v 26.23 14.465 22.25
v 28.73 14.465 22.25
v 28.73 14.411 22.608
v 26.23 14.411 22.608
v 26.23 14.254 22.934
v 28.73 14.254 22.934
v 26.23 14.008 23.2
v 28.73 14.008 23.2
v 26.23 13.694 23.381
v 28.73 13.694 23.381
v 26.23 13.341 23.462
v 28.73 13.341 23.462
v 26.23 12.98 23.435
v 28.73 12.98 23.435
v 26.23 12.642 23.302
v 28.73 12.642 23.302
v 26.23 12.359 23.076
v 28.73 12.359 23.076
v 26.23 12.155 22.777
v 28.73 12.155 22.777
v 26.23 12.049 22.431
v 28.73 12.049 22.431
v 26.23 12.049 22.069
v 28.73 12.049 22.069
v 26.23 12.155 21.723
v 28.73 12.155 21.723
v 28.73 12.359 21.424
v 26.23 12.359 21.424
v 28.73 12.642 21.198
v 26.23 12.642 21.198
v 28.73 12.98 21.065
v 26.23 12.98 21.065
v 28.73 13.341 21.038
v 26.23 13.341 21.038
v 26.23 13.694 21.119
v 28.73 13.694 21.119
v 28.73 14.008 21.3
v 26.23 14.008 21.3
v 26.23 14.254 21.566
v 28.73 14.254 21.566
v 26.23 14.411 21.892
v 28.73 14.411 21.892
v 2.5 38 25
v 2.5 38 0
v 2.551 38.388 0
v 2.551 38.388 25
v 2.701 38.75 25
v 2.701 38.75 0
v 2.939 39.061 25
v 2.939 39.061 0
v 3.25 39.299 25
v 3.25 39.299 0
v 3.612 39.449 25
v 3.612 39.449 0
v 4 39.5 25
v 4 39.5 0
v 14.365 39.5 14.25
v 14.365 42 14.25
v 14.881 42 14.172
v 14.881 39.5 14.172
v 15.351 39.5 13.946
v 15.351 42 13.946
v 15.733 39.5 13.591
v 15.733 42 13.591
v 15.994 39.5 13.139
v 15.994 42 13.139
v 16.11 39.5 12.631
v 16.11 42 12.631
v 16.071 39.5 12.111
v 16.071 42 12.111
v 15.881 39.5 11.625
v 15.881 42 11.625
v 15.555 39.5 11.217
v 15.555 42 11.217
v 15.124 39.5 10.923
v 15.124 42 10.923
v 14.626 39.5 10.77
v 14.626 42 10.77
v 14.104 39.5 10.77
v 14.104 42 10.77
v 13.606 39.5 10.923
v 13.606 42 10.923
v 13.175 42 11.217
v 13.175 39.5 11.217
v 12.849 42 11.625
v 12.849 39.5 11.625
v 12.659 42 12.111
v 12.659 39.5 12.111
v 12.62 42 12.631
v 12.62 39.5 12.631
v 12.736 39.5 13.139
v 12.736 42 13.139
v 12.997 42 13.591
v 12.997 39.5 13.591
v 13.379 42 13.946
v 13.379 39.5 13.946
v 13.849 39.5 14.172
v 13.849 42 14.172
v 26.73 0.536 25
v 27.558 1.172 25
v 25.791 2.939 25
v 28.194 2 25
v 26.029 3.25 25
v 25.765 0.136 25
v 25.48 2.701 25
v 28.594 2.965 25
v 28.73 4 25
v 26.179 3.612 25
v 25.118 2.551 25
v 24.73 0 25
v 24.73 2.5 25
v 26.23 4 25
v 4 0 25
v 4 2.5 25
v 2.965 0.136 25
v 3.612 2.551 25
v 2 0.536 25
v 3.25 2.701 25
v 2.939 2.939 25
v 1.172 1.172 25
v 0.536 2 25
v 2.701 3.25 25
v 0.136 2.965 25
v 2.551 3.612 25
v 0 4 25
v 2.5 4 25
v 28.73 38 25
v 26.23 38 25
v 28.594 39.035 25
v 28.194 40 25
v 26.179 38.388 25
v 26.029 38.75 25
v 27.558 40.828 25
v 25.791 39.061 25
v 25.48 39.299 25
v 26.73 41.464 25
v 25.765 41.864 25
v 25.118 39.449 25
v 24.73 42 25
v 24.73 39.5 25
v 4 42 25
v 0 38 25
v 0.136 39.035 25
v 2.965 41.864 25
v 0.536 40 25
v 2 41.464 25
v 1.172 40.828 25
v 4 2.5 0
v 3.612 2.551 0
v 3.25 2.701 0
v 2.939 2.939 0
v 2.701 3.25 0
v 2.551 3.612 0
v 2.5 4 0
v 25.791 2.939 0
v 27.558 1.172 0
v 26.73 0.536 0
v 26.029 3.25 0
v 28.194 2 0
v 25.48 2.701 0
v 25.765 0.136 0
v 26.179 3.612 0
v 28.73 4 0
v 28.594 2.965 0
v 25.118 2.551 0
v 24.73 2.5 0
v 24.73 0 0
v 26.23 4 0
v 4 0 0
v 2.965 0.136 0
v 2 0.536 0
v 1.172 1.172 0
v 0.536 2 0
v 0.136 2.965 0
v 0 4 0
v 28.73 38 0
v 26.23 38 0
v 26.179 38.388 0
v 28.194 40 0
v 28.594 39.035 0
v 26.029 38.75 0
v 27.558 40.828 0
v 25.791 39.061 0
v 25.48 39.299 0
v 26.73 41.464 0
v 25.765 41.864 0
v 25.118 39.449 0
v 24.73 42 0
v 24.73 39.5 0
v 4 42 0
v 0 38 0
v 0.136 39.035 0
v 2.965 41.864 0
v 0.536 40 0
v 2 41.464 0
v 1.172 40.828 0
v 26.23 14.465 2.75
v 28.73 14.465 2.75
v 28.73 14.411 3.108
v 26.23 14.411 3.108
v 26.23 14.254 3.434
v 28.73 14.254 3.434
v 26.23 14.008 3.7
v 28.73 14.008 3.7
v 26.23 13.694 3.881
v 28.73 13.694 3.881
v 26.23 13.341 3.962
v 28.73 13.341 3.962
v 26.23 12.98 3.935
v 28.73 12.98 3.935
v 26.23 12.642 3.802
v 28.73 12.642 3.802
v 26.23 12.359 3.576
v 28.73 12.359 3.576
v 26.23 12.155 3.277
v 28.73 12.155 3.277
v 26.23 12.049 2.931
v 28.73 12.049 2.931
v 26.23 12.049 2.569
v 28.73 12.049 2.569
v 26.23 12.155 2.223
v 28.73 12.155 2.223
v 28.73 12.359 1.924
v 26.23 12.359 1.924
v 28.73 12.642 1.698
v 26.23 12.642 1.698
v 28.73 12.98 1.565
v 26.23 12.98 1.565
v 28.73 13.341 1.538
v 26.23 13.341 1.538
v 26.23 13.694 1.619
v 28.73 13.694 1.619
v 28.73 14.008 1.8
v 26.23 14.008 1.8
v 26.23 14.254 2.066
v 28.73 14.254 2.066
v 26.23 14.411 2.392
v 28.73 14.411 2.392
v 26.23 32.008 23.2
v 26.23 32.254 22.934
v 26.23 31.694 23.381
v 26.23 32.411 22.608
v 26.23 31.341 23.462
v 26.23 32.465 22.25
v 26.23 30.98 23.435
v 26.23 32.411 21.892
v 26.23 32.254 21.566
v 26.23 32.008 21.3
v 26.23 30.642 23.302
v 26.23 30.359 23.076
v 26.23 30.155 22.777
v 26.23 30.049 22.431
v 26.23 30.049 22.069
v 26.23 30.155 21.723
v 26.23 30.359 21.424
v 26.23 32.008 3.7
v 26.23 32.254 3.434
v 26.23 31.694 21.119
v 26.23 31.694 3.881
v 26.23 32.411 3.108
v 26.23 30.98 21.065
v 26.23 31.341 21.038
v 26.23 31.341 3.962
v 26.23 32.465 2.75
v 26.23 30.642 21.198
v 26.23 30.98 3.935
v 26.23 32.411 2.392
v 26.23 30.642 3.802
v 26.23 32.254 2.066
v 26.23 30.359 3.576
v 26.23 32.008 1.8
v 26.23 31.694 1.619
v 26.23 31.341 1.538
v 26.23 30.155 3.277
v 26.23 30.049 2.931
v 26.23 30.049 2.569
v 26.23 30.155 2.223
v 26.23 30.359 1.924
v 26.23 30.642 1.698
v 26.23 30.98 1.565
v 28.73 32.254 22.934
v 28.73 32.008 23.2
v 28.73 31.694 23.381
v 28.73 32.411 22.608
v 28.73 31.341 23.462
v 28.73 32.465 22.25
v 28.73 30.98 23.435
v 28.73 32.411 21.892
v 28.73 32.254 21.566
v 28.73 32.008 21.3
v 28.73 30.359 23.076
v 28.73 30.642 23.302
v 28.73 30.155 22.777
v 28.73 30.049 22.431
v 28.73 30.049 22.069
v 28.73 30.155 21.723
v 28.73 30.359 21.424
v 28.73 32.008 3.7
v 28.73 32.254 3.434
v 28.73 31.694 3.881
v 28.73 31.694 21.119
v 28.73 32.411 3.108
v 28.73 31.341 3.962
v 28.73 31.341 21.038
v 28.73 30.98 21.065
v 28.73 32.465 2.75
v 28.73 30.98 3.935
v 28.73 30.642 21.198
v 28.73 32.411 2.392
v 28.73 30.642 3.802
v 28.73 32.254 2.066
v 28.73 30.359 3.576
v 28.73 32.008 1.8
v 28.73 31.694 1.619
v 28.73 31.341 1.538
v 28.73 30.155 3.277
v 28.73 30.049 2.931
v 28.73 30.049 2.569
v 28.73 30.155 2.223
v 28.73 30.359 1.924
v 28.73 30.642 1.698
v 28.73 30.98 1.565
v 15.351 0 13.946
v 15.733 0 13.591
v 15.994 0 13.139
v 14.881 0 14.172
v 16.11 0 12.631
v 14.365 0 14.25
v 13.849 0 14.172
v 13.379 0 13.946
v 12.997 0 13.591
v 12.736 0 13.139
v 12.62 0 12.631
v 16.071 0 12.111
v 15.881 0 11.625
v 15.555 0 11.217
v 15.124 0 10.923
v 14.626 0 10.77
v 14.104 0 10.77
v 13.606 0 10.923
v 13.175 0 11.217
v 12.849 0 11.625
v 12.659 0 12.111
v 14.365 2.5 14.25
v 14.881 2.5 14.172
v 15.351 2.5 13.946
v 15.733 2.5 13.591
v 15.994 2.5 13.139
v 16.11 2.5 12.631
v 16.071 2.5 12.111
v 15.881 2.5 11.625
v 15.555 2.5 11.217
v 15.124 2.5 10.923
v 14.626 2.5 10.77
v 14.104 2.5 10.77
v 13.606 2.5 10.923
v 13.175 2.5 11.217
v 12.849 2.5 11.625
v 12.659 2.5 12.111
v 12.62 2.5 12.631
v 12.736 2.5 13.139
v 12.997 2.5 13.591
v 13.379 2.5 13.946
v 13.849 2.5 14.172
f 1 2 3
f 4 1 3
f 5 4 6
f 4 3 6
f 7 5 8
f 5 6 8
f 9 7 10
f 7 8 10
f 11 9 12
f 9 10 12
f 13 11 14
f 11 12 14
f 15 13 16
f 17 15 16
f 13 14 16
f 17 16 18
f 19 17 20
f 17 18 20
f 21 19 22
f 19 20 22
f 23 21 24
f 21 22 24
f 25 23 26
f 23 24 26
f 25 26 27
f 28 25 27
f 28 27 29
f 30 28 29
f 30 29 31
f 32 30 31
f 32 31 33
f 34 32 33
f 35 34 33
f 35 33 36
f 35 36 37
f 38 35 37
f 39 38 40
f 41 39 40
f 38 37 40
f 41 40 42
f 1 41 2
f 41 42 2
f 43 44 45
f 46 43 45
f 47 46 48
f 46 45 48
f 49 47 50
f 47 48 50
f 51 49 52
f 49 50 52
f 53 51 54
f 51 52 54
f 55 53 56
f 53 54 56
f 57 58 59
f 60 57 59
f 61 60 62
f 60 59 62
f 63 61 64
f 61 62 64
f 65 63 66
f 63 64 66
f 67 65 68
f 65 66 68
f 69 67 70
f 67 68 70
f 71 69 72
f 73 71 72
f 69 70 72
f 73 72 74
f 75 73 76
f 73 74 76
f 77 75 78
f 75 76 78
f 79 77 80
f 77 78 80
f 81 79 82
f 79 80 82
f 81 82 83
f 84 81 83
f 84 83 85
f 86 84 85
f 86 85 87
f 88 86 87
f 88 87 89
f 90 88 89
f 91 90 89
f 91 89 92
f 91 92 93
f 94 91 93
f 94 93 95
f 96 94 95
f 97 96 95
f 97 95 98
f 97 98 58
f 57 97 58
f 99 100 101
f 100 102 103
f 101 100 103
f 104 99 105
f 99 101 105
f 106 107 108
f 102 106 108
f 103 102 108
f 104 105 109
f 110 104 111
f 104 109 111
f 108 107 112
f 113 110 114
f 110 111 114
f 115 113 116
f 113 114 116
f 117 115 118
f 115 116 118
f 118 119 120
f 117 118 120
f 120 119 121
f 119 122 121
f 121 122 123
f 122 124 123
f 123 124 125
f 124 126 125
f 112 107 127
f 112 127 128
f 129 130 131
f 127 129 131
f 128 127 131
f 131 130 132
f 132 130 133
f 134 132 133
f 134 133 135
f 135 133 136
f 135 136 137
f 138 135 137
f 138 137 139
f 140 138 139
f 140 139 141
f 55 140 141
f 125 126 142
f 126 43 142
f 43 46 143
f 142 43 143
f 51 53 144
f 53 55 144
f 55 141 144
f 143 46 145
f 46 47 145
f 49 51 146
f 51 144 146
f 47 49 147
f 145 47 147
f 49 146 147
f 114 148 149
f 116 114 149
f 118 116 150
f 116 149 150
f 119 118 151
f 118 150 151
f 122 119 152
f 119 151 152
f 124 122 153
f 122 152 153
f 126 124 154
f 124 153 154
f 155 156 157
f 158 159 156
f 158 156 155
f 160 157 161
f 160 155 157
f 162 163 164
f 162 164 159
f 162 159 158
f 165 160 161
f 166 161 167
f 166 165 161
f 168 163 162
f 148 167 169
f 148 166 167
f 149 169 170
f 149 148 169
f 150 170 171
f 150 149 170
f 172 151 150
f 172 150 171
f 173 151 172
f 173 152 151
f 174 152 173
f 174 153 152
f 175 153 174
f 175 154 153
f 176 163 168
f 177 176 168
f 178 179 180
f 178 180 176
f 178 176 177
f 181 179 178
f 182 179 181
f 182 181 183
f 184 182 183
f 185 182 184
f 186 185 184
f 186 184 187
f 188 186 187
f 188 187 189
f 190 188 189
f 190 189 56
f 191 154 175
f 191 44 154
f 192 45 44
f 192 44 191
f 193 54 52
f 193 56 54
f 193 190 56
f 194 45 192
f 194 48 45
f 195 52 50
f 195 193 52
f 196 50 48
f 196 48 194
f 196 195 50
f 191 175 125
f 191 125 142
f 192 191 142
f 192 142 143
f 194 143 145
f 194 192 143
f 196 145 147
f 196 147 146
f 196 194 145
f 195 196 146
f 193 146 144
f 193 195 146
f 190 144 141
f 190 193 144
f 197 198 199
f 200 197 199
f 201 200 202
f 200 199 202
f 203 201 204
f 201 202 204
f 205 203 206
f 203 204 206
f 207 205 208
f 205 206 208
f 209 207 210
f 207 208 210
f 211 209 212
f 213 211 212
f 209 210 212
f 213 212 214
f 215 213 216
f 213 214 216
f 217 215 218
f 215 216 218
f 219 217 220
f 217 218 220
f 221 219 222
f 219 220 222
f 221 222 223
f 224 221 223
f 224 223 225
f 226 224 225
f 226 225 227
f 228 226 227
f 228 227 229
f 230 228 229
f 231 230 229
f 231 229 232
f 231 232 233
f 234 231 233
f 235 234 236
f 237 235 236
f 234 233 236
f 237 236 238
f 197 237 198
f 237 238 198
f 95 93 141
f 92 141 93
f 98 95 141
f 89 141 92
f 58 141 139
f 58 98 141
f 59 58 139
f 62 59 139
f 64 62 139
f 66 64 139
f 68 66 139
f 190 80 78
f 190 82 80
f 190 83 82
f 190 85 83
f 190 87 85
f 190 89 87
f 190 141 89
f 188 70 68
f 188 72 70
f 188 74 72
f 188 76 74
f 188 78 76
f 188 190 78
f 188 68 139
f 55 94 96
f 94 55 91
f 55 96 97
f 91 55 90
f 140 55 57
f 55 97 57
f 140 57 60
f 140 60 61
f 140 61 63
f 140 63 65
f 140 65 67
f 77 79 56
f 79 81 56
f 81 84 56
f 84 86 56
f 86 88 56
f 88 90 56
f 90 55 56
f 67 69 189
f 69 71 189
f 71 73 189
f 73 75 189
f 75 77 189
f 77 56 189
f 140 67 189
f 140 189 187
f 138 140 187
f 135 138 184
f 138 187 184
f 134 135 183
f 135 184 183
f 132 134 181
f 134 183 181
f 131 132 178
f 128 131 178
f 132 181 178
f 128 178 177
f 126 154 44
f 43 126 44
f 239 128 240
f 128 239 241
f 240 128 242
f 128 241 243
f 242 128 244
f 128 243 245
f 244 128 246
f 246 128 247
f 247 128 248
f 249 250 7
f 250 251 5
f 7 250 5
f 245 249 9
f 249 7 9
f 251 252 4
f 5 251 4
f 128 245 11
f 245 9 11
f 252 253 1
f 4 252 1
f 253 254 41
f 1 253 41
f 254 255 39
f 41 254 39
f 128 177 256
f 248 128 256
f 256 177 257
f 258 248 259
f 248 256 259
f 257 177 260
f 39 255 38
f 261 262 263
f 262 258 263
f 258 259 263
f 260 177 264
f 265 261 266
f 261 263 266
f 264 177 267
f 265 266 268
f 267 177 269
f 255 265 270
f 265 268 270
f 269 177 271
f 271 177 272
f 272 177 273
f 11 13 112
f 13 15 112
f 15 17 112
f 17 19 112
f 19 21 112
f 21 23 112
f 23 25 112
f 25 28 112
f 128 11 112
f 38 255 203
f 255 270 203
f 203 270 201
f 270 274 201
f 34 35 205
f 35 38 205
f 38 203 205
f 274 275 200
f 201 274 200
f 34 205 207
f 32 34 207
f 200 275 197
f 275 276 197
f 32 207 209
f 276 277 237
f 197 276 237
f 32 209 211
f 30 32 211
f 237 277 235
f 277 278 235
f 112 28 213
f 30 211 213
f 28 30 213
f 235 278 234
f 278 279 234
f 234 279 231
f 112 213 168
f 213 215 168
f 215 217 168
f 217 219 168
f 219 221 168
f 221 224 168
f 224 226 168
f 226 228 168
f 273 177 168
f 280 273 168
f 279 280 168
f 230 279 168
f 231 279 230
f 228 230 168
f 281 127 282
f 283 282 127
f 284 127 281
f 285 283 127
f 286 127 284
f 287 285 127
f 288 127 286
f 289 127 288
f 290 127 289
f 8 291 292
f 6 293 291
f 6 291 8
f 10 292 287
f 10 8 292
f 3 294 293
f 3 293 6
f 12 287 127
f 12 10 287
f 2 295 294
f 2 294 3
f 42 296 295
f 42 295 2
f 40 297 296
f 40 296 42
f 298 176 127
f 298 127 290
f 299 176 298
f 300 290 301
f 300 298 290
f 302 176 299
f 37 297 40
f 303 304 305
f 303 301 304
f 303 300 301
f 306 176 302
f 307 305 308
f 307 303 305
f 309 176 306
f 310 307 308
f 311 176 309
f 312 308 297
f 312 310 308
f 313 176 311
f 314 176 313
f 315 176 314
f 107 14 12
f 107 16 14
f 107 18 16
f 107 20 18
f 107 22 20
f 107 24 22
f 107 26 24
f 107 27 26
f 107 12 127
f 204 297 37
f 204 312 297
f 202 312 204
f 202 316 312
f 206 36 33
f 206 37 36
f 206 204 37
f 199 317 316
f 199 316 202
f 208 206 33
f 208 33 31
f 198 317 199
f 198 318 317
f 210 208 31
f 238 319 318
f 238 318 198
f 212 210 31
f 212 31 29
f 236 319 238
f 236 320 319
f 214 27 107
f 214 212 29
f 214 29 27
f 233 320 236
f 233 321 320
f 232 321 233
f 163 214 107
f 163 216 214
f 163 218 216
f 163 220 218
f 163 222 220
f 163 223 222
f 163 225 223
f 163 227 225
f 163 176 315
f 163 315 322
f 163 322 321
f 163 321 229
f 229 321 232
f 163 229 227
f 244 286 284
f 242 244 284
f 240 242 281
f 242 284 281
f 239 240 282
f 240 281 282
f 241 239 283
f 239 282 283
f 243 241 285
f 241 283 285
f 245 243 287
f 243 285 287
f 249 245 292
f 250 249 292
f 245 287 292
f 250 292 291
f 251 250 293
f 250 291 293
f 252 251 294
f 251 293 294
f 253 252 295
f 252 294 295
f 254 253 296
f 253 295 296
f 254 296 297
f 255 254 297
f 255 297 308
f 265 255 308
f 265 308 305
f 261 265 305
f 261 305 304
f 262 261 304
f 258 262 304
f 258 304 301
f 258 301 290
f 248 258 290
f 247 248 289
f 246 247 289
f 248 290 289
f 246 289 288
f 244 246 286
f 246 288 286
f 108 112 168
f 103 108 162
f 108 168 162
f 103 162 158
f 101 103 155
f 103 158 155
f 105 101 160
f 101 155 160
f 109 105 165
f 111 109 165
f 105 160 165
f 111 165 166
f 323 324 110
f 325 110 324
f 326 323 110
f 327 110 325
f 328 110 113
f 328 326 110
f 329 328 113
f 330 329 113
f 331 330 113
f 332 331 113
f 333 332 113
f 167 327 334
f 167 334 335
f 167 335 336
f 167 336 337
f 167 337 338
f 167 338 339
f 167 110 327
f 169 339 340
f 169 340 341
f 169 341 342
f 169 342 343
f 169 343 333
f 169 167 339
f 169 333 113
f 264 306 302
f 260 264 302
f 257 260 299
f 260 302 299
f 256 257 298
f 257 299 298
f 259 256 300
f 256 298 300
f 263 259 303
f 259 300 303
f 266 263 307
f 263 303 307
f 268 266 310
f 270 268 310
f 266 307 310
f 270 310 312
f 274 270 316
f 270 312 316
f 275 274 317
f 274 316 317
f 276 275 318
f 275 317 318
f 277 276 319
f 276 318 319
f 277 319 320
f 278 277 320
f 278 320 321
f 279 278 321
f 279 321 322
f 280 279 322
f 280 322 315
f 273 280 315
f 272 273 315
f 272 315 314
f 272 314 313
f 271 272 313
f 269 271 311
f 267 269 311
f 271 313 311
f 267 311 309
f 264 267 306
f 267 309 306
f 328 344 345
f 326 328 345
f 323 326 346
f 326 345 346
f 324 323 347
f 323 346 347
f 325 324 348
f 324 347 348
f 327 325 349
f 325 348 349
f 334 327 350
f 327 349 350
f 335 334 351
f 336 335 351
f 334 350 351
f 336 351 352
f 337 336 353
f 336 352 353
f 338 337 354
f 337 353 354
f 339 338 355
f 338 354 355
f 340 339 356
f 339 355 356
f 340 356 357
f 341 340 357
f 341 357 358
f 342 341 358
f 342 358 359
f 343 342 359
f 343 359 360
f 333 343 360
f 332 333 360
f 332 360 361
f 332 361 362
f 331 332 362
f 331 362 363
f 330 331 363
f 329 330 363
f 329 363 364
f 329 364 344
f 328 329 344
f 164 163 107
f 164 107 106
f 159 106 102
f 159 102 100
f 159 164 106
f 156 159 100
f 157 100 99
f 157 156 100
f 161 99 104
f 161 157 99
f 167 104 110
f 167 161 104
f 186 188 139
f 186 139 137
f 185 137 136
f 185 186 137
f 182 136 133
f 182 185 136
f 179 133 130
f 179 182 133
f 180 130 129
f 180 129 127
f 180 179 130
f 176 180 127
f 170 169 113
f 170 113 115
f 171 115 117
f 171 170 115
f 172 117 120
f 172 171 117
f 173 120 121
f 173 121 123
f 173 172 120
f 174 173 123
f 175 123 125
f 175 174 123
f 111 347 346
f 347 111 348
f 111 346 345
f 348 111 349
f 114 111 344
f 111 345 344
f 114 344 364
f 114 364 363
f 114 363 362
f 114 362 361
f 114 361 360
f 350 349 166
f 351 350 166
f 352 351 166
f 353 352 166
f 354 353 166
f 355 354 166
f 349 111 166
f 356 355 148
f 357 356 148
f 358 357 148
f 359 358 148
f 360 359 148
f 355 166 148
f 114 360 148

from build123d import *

# Parameters (mm, degrees)
BOSS_EXTRUDE1_DEPTH  = 25
SHELL1_T             = -2.5
SKETCH2_R            = 1.75
CUT_EXTRUDE1_DEPTH   = 57.695792613
SKETCH3_R            = 1.215
CUT_EXTRUDE2_DEPTH   = 2.5
LPATTERN1_COUNT      = 2
LPATTERN1_PITCH      = 18
LPATTERN1_COUNT_DIR2 = 2
LPATTERN1_PITCH_DIR2 = 19.5


with BuildPart() as part:
    # Sketch1 → Boss-Extrude1 (new body)
    with BuildSketch(Plane.XY):
        with BuildLine():
            Line((0, 4), (0, 38))
            ThreePointArc((0, 38), (1.171572875, 40.828427125), (4, 42))
            Line((4, 42), (24.73, 42))
            ThreePointArc((24.73, 42), (27.558427125, 40.828427125), (28.73, 38))
            Line((28.73, 38), (28.73, 4))
            ThreePointArc((28.73, 4), (27.558427125, 1.171572875), (24.73, 0))
            Line((24.73, 0), (4, 0))
            ThreePointArc((4, 0), (1.171572875, 1.171572875), (0, 4))
        make_face()
    extrude(amount=BOSS_EXTRUDE1_DEPTH)

    # Shell1
    shell1_openings = [part.faces().sort_by_distance(p)[0] for p in [
        (14.365, 21, 25),
        (14.365, 21, 0),
    ]]
    offset(amount=SHELL1_T, openings=shell1_openings, kind=Kind.INTERSECTION)

    # Sketch2 → Cut-Extrude1 (cut, through all)
    with BuildSketch(Plane(origin=(0, 42, 0), x_dir=(1, 0, 0), z_dir=(0, 1, 0))):
        with Locations(Location((14.365, -12.5, 0), (0, 0, 270))):
            Circle(SKETCH2_R)
    extrude(amount=-CUT_EXTRUDE1_DEPTH, mode=Mode.SUBTRACT)

    # Sketch3 → Cut-Extrude2 (cut)
    with BuildSketch(Plane(origin=(28.73, 0, 0), x_dir=(0, 0, -1), z_dir=(1, 0, 0))):
        with Locations(Location((-22.25, 31.25, 0), (0, 0, 90))):
            Circle(SKETCH3_R)
    cut_extrude2 = extrude(amount=-CUT_EXTRUDE2_DEPTH, mode=Mode.SUBTRACT)

    # LPattern1: Cut-Extrude2 2 × 2
    with Locations(*[(0, -i * LPATTERN1_PITCH, -j * LPATTERN1_PITCH_DIR2) for i in range(LPATTERN1_COUNT) for j in range(LPATTERN1_COUNT_DIR2) if (i, j) != (0, 0)]):
        add(cut_extrude2, mode=Mode.SUBTRACT)


solid = part.part
